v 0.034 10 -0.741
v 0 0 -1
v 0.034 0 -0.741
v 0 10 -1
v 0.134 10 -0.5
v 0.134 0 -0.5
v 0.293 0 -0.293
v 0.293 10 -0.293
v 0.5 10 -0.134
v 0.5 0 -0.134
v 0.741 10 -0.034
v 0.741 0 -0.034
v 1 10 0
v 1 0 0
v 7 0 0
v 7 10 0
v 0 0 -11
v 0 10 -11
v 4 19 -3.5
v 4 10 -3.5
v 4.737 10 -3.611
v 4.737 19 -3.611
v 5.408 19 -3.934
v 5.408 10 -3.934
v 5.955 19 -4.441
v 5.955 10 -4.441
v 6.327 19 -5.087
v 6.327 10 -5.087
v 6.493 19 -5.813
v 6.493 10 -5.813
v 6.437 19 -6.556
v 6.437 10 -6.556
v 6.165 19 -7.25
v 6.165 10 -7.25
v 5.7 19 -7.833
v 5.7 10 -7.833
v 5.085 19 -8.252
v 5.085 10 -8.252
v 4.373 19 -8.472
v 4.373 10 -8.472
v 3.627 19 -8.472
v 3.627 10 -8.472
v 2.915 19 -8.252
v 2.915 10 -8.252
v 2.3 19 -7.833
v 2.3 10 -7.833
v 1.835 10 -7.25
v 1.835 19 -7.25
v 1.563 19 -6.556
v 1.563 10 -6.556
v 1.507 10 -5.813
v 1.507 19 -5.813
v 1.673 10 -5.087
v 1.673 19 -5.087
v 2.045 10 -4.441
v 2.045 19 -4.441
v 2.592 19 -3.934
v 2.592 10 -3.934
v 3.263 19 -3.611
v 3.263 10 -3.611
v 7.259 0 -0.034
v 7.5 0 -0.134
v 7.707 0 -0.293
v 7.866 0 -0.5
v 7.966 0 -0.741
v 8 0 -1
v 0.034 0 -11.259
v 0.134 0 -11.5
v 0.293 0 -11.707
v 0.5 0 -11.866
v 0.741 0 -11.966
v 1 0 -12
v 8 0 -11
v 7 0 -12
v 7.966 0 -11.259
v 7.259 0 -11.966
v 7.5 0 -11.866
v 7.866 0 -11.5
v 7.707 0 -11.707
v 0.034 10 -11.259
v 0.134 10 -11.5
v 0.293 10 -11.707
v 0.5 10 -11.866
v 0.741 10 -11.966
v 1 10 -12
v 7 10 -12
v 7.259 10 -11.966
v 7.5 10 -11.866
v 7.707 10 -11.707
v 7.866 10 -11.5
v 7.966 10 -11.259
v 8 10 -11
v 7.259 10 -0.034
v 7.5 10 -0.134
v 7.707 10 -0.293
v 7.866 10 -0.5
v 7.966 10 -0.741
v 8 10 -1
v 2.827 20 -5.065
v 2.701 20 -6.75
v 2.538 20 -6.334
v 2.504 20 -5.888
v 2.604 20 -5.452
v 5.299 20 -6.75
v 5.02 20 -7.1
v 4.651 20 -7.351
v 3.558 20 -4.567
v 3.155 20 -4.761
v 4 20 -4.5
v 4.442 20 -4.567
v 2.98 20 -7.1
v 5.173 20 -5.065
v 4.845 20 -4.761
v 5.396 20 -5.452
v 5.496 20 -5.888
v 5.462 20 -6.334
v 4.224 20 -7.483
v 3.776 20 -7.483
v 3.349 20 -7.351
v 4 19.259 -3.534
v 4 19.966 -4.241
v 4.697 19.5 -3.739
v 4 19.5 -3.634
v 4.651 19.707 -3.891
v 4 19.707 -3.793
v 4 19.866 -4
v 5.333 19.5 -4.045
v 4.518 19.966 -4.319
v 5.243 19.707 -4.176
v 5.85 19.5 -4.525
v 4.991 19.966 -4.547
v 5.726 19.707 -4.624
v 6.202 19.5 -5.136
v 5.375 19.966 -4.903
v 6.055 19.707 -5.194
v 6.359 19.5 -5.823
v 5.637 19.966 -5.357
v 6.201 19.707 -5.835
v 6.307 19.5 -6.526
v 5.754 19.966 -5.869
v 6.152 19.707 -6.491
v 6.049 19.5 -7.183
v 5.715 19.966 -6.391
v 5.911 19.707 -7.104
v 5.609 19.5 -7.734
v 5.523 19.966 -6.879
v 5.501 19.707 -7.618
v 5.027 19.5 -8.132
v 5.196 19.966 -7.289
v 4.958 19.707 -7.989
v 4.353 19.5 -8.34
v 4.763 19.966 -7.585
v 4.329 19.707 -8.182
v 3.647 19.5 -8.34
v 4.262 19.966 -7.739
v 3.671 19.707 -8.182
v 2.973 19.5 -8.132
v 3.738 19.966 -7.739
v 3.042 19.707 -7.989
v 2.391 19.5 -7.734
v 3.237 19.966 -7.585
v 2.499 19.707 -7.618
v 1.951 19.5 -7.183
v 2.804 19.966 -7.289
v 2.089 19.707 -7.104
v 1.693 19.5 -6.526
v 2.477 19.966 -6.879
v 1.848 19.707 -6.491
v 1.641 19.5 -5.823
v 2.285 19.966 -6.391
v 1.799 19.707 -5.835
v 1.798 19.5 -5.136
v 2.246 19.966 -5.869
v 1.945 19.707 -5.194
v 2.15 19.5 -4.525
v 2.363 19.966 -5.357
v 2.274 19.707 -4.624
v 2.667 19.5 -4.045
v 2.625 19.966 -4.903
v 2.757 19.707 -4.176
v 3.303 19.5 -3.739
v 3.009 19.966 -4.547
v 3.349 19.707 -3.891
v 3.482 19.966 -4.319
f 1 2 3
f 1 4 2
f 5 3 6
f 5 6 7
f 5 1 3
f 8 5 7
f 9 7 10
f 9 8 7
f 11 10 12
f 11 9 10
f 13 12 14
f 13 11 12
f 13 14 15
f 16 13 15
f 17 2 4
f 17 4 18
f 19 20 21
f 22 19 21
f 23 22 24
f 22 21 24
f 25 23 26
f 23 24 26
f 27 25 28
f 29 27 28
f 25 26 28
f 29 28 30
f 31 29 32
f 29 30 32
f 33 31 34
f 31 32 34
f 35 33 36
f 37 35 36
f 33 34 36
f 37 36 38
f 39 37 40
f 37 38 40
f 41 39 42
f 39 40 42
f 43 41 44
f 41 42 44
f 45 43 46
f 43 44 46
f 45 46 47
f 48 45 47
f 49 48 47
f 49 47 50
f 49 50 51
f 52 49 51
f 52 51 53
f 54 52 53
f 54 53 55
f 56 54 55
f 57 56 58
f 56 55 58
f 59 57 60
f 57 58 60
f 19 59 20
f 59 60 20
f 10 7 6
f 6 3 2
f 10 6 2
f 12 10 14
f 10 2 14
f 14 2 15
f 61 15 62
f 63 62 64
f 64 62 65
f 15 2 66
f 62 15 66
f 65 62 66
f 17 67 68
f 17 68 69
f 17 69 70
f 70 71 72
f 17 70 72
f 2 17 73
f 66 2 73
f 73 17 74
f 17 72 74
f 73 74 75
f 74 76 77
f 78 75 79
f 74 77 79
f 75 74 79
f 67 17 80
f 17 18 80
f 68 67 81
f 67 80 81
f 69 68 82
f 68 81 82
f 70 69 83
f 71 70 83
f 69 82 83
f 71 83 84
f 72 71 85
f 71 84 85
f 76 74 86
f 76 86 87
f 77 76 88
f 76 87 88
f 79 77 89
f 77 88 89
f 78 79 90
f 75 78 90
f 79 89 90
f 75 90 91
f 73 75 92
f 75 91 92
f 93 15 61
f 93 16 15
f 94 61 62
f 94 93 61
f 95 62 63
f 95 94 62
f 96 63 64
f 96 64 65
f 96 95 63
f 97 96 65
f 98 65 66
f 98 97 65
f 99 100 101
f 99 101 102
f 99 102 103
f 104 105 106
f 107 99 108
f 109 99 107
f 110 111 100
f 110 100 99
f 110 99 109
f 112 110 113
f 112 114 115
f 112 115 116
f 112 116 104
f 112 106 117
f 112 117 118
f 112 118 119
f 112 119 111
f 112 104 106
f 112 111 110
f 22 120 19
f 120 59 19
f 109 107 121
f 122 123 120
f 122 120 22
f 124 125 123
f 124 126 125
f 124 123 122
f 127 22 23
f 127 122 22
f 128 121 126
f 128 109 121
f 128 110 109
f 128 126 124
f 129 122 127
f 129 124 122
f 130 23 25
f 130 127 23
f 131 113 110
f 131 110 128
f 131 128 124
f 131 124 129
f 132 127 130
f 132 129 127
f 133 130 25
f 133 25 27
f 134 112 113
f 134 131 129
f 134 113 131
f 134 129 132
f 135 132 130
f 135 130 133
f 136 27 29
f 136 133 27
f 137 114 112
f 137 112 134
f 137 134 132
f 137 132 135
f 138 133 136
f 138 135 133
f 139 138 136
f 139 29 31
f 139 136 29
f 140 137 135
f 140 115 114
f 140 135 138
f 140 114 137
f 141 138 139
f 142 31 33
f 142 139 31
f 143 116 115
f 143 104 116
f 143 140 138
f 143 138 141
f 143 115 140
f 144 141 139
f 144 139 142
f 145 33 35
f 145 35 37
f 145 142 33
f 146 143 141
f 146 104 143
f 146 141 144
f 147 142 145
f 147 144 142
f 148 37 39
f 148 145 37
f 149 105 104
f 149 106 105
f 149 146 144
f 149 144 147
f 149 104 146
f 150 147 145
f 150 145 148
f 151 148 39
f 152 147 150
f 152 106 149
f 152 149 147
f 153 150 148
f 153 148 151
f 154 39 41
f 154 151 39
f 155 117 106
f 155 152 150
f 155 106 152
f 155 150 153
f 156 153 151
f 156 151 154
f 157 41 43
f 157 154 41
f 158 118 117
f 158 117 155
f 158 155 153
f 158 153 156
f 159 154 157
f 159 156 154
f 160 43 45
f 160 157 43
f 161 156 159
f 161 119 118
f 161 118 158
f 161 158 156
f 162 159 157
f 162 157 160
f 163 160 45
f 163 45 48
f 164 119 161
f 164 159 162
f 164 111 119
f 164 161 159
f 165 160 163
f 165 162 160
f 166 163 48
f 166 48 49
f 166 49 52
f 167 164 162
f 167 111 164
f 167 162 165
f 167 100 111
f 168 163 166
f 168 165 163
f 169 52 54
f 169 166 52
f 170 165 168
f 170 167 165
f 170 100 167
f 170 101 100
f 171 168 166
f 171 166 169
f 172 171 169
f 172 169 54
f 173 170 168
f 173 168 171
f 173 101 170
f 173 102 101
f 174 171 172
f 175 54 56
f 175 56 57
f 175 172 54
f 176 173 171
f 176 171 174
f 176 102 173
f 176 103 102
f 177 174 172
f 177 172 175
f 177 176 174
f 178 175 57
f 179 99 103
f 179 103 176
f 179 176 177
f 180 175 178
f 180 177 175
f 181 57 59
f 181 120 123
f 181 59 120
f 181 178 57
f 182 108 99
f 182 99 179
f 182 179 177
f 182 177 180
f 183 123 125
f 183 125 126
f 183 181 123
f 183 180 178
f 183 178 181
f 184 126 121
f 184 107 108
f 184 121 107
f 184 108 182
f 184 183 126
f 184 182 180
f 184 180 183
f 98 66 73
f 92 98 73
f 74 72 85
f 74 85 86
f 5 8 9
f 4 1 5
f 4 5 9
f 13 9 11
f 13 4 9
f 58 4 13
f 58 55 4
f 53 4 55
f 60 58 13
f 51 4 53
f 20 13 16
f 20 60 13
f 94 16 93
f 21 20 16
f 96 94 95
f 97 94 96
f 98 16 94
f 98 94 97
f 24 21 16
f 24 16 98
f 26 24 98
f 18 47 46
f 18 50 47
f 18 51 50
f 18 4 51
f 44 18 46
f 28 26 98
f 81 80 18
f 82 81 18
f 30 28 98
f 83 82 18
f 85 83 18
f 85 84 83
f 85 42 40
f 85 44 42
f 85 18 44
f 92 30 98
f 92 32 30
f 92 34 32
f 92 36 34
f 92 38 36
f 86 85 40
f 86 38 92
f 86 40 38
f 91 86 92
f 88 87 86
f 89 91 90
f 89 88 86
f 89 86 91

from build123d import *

# Parameters (mm, degrees)
SKETCH1_W           = 8
SKETCH1_H           = 12
BOSS_EXTRUDE1_DEPTH = 10
SKETCH2_R           = 2.5
BOSS_EXTRUDE2_DEPTH = 10
FILLET1_R           = 1
FILLET2_R           = 1


with BuildPart() as part:
    # Sketch1 → Boss-Extrude1 (new body)
    with BuildSketch(Plane(origin=(0, 0, 0), x_dir=(1, 0, 0), z_dir=(0, 1, 0))):
        with Locations((4, 6)):
            Rectangle(SKETCH1_W, SKETCH1_H)
    extrude(amount=BOSS_EXTRUDE1_DEPTH)

    # Sketch2 → Boss-Extrude2 (add)
    with BuildSketch(Plane(origin=(0, 10, 0), x_dir=(1, 0, 0), z_dir=(0, 1, 0))):
        with Locations(Location((4, 6, 0), (0, 0, 270))):
            Circle(SKETCH2_R)
    extrude(amount=BOSS_EXTRUDE2_DEPTH)

    # Fillet1
    fillet1_edges = [part.edges().sort_by_distance(p)[0] for p in [
        (4, 20, -8.5),
    ]]
    fillet(fillet1_edges, radius=FILLET1_R)

    # Fillet2
    fillet2_edges = [part.edges().sort_by_distance(p)[0] for p in [
        (0, 5, -12),
        (8, 5, -12),
        (8, 5, 0),
        (0, 5, 0),
    ]]
    fillet(fillet2_edges, radius=FILLET2_R)


solid = part.part
